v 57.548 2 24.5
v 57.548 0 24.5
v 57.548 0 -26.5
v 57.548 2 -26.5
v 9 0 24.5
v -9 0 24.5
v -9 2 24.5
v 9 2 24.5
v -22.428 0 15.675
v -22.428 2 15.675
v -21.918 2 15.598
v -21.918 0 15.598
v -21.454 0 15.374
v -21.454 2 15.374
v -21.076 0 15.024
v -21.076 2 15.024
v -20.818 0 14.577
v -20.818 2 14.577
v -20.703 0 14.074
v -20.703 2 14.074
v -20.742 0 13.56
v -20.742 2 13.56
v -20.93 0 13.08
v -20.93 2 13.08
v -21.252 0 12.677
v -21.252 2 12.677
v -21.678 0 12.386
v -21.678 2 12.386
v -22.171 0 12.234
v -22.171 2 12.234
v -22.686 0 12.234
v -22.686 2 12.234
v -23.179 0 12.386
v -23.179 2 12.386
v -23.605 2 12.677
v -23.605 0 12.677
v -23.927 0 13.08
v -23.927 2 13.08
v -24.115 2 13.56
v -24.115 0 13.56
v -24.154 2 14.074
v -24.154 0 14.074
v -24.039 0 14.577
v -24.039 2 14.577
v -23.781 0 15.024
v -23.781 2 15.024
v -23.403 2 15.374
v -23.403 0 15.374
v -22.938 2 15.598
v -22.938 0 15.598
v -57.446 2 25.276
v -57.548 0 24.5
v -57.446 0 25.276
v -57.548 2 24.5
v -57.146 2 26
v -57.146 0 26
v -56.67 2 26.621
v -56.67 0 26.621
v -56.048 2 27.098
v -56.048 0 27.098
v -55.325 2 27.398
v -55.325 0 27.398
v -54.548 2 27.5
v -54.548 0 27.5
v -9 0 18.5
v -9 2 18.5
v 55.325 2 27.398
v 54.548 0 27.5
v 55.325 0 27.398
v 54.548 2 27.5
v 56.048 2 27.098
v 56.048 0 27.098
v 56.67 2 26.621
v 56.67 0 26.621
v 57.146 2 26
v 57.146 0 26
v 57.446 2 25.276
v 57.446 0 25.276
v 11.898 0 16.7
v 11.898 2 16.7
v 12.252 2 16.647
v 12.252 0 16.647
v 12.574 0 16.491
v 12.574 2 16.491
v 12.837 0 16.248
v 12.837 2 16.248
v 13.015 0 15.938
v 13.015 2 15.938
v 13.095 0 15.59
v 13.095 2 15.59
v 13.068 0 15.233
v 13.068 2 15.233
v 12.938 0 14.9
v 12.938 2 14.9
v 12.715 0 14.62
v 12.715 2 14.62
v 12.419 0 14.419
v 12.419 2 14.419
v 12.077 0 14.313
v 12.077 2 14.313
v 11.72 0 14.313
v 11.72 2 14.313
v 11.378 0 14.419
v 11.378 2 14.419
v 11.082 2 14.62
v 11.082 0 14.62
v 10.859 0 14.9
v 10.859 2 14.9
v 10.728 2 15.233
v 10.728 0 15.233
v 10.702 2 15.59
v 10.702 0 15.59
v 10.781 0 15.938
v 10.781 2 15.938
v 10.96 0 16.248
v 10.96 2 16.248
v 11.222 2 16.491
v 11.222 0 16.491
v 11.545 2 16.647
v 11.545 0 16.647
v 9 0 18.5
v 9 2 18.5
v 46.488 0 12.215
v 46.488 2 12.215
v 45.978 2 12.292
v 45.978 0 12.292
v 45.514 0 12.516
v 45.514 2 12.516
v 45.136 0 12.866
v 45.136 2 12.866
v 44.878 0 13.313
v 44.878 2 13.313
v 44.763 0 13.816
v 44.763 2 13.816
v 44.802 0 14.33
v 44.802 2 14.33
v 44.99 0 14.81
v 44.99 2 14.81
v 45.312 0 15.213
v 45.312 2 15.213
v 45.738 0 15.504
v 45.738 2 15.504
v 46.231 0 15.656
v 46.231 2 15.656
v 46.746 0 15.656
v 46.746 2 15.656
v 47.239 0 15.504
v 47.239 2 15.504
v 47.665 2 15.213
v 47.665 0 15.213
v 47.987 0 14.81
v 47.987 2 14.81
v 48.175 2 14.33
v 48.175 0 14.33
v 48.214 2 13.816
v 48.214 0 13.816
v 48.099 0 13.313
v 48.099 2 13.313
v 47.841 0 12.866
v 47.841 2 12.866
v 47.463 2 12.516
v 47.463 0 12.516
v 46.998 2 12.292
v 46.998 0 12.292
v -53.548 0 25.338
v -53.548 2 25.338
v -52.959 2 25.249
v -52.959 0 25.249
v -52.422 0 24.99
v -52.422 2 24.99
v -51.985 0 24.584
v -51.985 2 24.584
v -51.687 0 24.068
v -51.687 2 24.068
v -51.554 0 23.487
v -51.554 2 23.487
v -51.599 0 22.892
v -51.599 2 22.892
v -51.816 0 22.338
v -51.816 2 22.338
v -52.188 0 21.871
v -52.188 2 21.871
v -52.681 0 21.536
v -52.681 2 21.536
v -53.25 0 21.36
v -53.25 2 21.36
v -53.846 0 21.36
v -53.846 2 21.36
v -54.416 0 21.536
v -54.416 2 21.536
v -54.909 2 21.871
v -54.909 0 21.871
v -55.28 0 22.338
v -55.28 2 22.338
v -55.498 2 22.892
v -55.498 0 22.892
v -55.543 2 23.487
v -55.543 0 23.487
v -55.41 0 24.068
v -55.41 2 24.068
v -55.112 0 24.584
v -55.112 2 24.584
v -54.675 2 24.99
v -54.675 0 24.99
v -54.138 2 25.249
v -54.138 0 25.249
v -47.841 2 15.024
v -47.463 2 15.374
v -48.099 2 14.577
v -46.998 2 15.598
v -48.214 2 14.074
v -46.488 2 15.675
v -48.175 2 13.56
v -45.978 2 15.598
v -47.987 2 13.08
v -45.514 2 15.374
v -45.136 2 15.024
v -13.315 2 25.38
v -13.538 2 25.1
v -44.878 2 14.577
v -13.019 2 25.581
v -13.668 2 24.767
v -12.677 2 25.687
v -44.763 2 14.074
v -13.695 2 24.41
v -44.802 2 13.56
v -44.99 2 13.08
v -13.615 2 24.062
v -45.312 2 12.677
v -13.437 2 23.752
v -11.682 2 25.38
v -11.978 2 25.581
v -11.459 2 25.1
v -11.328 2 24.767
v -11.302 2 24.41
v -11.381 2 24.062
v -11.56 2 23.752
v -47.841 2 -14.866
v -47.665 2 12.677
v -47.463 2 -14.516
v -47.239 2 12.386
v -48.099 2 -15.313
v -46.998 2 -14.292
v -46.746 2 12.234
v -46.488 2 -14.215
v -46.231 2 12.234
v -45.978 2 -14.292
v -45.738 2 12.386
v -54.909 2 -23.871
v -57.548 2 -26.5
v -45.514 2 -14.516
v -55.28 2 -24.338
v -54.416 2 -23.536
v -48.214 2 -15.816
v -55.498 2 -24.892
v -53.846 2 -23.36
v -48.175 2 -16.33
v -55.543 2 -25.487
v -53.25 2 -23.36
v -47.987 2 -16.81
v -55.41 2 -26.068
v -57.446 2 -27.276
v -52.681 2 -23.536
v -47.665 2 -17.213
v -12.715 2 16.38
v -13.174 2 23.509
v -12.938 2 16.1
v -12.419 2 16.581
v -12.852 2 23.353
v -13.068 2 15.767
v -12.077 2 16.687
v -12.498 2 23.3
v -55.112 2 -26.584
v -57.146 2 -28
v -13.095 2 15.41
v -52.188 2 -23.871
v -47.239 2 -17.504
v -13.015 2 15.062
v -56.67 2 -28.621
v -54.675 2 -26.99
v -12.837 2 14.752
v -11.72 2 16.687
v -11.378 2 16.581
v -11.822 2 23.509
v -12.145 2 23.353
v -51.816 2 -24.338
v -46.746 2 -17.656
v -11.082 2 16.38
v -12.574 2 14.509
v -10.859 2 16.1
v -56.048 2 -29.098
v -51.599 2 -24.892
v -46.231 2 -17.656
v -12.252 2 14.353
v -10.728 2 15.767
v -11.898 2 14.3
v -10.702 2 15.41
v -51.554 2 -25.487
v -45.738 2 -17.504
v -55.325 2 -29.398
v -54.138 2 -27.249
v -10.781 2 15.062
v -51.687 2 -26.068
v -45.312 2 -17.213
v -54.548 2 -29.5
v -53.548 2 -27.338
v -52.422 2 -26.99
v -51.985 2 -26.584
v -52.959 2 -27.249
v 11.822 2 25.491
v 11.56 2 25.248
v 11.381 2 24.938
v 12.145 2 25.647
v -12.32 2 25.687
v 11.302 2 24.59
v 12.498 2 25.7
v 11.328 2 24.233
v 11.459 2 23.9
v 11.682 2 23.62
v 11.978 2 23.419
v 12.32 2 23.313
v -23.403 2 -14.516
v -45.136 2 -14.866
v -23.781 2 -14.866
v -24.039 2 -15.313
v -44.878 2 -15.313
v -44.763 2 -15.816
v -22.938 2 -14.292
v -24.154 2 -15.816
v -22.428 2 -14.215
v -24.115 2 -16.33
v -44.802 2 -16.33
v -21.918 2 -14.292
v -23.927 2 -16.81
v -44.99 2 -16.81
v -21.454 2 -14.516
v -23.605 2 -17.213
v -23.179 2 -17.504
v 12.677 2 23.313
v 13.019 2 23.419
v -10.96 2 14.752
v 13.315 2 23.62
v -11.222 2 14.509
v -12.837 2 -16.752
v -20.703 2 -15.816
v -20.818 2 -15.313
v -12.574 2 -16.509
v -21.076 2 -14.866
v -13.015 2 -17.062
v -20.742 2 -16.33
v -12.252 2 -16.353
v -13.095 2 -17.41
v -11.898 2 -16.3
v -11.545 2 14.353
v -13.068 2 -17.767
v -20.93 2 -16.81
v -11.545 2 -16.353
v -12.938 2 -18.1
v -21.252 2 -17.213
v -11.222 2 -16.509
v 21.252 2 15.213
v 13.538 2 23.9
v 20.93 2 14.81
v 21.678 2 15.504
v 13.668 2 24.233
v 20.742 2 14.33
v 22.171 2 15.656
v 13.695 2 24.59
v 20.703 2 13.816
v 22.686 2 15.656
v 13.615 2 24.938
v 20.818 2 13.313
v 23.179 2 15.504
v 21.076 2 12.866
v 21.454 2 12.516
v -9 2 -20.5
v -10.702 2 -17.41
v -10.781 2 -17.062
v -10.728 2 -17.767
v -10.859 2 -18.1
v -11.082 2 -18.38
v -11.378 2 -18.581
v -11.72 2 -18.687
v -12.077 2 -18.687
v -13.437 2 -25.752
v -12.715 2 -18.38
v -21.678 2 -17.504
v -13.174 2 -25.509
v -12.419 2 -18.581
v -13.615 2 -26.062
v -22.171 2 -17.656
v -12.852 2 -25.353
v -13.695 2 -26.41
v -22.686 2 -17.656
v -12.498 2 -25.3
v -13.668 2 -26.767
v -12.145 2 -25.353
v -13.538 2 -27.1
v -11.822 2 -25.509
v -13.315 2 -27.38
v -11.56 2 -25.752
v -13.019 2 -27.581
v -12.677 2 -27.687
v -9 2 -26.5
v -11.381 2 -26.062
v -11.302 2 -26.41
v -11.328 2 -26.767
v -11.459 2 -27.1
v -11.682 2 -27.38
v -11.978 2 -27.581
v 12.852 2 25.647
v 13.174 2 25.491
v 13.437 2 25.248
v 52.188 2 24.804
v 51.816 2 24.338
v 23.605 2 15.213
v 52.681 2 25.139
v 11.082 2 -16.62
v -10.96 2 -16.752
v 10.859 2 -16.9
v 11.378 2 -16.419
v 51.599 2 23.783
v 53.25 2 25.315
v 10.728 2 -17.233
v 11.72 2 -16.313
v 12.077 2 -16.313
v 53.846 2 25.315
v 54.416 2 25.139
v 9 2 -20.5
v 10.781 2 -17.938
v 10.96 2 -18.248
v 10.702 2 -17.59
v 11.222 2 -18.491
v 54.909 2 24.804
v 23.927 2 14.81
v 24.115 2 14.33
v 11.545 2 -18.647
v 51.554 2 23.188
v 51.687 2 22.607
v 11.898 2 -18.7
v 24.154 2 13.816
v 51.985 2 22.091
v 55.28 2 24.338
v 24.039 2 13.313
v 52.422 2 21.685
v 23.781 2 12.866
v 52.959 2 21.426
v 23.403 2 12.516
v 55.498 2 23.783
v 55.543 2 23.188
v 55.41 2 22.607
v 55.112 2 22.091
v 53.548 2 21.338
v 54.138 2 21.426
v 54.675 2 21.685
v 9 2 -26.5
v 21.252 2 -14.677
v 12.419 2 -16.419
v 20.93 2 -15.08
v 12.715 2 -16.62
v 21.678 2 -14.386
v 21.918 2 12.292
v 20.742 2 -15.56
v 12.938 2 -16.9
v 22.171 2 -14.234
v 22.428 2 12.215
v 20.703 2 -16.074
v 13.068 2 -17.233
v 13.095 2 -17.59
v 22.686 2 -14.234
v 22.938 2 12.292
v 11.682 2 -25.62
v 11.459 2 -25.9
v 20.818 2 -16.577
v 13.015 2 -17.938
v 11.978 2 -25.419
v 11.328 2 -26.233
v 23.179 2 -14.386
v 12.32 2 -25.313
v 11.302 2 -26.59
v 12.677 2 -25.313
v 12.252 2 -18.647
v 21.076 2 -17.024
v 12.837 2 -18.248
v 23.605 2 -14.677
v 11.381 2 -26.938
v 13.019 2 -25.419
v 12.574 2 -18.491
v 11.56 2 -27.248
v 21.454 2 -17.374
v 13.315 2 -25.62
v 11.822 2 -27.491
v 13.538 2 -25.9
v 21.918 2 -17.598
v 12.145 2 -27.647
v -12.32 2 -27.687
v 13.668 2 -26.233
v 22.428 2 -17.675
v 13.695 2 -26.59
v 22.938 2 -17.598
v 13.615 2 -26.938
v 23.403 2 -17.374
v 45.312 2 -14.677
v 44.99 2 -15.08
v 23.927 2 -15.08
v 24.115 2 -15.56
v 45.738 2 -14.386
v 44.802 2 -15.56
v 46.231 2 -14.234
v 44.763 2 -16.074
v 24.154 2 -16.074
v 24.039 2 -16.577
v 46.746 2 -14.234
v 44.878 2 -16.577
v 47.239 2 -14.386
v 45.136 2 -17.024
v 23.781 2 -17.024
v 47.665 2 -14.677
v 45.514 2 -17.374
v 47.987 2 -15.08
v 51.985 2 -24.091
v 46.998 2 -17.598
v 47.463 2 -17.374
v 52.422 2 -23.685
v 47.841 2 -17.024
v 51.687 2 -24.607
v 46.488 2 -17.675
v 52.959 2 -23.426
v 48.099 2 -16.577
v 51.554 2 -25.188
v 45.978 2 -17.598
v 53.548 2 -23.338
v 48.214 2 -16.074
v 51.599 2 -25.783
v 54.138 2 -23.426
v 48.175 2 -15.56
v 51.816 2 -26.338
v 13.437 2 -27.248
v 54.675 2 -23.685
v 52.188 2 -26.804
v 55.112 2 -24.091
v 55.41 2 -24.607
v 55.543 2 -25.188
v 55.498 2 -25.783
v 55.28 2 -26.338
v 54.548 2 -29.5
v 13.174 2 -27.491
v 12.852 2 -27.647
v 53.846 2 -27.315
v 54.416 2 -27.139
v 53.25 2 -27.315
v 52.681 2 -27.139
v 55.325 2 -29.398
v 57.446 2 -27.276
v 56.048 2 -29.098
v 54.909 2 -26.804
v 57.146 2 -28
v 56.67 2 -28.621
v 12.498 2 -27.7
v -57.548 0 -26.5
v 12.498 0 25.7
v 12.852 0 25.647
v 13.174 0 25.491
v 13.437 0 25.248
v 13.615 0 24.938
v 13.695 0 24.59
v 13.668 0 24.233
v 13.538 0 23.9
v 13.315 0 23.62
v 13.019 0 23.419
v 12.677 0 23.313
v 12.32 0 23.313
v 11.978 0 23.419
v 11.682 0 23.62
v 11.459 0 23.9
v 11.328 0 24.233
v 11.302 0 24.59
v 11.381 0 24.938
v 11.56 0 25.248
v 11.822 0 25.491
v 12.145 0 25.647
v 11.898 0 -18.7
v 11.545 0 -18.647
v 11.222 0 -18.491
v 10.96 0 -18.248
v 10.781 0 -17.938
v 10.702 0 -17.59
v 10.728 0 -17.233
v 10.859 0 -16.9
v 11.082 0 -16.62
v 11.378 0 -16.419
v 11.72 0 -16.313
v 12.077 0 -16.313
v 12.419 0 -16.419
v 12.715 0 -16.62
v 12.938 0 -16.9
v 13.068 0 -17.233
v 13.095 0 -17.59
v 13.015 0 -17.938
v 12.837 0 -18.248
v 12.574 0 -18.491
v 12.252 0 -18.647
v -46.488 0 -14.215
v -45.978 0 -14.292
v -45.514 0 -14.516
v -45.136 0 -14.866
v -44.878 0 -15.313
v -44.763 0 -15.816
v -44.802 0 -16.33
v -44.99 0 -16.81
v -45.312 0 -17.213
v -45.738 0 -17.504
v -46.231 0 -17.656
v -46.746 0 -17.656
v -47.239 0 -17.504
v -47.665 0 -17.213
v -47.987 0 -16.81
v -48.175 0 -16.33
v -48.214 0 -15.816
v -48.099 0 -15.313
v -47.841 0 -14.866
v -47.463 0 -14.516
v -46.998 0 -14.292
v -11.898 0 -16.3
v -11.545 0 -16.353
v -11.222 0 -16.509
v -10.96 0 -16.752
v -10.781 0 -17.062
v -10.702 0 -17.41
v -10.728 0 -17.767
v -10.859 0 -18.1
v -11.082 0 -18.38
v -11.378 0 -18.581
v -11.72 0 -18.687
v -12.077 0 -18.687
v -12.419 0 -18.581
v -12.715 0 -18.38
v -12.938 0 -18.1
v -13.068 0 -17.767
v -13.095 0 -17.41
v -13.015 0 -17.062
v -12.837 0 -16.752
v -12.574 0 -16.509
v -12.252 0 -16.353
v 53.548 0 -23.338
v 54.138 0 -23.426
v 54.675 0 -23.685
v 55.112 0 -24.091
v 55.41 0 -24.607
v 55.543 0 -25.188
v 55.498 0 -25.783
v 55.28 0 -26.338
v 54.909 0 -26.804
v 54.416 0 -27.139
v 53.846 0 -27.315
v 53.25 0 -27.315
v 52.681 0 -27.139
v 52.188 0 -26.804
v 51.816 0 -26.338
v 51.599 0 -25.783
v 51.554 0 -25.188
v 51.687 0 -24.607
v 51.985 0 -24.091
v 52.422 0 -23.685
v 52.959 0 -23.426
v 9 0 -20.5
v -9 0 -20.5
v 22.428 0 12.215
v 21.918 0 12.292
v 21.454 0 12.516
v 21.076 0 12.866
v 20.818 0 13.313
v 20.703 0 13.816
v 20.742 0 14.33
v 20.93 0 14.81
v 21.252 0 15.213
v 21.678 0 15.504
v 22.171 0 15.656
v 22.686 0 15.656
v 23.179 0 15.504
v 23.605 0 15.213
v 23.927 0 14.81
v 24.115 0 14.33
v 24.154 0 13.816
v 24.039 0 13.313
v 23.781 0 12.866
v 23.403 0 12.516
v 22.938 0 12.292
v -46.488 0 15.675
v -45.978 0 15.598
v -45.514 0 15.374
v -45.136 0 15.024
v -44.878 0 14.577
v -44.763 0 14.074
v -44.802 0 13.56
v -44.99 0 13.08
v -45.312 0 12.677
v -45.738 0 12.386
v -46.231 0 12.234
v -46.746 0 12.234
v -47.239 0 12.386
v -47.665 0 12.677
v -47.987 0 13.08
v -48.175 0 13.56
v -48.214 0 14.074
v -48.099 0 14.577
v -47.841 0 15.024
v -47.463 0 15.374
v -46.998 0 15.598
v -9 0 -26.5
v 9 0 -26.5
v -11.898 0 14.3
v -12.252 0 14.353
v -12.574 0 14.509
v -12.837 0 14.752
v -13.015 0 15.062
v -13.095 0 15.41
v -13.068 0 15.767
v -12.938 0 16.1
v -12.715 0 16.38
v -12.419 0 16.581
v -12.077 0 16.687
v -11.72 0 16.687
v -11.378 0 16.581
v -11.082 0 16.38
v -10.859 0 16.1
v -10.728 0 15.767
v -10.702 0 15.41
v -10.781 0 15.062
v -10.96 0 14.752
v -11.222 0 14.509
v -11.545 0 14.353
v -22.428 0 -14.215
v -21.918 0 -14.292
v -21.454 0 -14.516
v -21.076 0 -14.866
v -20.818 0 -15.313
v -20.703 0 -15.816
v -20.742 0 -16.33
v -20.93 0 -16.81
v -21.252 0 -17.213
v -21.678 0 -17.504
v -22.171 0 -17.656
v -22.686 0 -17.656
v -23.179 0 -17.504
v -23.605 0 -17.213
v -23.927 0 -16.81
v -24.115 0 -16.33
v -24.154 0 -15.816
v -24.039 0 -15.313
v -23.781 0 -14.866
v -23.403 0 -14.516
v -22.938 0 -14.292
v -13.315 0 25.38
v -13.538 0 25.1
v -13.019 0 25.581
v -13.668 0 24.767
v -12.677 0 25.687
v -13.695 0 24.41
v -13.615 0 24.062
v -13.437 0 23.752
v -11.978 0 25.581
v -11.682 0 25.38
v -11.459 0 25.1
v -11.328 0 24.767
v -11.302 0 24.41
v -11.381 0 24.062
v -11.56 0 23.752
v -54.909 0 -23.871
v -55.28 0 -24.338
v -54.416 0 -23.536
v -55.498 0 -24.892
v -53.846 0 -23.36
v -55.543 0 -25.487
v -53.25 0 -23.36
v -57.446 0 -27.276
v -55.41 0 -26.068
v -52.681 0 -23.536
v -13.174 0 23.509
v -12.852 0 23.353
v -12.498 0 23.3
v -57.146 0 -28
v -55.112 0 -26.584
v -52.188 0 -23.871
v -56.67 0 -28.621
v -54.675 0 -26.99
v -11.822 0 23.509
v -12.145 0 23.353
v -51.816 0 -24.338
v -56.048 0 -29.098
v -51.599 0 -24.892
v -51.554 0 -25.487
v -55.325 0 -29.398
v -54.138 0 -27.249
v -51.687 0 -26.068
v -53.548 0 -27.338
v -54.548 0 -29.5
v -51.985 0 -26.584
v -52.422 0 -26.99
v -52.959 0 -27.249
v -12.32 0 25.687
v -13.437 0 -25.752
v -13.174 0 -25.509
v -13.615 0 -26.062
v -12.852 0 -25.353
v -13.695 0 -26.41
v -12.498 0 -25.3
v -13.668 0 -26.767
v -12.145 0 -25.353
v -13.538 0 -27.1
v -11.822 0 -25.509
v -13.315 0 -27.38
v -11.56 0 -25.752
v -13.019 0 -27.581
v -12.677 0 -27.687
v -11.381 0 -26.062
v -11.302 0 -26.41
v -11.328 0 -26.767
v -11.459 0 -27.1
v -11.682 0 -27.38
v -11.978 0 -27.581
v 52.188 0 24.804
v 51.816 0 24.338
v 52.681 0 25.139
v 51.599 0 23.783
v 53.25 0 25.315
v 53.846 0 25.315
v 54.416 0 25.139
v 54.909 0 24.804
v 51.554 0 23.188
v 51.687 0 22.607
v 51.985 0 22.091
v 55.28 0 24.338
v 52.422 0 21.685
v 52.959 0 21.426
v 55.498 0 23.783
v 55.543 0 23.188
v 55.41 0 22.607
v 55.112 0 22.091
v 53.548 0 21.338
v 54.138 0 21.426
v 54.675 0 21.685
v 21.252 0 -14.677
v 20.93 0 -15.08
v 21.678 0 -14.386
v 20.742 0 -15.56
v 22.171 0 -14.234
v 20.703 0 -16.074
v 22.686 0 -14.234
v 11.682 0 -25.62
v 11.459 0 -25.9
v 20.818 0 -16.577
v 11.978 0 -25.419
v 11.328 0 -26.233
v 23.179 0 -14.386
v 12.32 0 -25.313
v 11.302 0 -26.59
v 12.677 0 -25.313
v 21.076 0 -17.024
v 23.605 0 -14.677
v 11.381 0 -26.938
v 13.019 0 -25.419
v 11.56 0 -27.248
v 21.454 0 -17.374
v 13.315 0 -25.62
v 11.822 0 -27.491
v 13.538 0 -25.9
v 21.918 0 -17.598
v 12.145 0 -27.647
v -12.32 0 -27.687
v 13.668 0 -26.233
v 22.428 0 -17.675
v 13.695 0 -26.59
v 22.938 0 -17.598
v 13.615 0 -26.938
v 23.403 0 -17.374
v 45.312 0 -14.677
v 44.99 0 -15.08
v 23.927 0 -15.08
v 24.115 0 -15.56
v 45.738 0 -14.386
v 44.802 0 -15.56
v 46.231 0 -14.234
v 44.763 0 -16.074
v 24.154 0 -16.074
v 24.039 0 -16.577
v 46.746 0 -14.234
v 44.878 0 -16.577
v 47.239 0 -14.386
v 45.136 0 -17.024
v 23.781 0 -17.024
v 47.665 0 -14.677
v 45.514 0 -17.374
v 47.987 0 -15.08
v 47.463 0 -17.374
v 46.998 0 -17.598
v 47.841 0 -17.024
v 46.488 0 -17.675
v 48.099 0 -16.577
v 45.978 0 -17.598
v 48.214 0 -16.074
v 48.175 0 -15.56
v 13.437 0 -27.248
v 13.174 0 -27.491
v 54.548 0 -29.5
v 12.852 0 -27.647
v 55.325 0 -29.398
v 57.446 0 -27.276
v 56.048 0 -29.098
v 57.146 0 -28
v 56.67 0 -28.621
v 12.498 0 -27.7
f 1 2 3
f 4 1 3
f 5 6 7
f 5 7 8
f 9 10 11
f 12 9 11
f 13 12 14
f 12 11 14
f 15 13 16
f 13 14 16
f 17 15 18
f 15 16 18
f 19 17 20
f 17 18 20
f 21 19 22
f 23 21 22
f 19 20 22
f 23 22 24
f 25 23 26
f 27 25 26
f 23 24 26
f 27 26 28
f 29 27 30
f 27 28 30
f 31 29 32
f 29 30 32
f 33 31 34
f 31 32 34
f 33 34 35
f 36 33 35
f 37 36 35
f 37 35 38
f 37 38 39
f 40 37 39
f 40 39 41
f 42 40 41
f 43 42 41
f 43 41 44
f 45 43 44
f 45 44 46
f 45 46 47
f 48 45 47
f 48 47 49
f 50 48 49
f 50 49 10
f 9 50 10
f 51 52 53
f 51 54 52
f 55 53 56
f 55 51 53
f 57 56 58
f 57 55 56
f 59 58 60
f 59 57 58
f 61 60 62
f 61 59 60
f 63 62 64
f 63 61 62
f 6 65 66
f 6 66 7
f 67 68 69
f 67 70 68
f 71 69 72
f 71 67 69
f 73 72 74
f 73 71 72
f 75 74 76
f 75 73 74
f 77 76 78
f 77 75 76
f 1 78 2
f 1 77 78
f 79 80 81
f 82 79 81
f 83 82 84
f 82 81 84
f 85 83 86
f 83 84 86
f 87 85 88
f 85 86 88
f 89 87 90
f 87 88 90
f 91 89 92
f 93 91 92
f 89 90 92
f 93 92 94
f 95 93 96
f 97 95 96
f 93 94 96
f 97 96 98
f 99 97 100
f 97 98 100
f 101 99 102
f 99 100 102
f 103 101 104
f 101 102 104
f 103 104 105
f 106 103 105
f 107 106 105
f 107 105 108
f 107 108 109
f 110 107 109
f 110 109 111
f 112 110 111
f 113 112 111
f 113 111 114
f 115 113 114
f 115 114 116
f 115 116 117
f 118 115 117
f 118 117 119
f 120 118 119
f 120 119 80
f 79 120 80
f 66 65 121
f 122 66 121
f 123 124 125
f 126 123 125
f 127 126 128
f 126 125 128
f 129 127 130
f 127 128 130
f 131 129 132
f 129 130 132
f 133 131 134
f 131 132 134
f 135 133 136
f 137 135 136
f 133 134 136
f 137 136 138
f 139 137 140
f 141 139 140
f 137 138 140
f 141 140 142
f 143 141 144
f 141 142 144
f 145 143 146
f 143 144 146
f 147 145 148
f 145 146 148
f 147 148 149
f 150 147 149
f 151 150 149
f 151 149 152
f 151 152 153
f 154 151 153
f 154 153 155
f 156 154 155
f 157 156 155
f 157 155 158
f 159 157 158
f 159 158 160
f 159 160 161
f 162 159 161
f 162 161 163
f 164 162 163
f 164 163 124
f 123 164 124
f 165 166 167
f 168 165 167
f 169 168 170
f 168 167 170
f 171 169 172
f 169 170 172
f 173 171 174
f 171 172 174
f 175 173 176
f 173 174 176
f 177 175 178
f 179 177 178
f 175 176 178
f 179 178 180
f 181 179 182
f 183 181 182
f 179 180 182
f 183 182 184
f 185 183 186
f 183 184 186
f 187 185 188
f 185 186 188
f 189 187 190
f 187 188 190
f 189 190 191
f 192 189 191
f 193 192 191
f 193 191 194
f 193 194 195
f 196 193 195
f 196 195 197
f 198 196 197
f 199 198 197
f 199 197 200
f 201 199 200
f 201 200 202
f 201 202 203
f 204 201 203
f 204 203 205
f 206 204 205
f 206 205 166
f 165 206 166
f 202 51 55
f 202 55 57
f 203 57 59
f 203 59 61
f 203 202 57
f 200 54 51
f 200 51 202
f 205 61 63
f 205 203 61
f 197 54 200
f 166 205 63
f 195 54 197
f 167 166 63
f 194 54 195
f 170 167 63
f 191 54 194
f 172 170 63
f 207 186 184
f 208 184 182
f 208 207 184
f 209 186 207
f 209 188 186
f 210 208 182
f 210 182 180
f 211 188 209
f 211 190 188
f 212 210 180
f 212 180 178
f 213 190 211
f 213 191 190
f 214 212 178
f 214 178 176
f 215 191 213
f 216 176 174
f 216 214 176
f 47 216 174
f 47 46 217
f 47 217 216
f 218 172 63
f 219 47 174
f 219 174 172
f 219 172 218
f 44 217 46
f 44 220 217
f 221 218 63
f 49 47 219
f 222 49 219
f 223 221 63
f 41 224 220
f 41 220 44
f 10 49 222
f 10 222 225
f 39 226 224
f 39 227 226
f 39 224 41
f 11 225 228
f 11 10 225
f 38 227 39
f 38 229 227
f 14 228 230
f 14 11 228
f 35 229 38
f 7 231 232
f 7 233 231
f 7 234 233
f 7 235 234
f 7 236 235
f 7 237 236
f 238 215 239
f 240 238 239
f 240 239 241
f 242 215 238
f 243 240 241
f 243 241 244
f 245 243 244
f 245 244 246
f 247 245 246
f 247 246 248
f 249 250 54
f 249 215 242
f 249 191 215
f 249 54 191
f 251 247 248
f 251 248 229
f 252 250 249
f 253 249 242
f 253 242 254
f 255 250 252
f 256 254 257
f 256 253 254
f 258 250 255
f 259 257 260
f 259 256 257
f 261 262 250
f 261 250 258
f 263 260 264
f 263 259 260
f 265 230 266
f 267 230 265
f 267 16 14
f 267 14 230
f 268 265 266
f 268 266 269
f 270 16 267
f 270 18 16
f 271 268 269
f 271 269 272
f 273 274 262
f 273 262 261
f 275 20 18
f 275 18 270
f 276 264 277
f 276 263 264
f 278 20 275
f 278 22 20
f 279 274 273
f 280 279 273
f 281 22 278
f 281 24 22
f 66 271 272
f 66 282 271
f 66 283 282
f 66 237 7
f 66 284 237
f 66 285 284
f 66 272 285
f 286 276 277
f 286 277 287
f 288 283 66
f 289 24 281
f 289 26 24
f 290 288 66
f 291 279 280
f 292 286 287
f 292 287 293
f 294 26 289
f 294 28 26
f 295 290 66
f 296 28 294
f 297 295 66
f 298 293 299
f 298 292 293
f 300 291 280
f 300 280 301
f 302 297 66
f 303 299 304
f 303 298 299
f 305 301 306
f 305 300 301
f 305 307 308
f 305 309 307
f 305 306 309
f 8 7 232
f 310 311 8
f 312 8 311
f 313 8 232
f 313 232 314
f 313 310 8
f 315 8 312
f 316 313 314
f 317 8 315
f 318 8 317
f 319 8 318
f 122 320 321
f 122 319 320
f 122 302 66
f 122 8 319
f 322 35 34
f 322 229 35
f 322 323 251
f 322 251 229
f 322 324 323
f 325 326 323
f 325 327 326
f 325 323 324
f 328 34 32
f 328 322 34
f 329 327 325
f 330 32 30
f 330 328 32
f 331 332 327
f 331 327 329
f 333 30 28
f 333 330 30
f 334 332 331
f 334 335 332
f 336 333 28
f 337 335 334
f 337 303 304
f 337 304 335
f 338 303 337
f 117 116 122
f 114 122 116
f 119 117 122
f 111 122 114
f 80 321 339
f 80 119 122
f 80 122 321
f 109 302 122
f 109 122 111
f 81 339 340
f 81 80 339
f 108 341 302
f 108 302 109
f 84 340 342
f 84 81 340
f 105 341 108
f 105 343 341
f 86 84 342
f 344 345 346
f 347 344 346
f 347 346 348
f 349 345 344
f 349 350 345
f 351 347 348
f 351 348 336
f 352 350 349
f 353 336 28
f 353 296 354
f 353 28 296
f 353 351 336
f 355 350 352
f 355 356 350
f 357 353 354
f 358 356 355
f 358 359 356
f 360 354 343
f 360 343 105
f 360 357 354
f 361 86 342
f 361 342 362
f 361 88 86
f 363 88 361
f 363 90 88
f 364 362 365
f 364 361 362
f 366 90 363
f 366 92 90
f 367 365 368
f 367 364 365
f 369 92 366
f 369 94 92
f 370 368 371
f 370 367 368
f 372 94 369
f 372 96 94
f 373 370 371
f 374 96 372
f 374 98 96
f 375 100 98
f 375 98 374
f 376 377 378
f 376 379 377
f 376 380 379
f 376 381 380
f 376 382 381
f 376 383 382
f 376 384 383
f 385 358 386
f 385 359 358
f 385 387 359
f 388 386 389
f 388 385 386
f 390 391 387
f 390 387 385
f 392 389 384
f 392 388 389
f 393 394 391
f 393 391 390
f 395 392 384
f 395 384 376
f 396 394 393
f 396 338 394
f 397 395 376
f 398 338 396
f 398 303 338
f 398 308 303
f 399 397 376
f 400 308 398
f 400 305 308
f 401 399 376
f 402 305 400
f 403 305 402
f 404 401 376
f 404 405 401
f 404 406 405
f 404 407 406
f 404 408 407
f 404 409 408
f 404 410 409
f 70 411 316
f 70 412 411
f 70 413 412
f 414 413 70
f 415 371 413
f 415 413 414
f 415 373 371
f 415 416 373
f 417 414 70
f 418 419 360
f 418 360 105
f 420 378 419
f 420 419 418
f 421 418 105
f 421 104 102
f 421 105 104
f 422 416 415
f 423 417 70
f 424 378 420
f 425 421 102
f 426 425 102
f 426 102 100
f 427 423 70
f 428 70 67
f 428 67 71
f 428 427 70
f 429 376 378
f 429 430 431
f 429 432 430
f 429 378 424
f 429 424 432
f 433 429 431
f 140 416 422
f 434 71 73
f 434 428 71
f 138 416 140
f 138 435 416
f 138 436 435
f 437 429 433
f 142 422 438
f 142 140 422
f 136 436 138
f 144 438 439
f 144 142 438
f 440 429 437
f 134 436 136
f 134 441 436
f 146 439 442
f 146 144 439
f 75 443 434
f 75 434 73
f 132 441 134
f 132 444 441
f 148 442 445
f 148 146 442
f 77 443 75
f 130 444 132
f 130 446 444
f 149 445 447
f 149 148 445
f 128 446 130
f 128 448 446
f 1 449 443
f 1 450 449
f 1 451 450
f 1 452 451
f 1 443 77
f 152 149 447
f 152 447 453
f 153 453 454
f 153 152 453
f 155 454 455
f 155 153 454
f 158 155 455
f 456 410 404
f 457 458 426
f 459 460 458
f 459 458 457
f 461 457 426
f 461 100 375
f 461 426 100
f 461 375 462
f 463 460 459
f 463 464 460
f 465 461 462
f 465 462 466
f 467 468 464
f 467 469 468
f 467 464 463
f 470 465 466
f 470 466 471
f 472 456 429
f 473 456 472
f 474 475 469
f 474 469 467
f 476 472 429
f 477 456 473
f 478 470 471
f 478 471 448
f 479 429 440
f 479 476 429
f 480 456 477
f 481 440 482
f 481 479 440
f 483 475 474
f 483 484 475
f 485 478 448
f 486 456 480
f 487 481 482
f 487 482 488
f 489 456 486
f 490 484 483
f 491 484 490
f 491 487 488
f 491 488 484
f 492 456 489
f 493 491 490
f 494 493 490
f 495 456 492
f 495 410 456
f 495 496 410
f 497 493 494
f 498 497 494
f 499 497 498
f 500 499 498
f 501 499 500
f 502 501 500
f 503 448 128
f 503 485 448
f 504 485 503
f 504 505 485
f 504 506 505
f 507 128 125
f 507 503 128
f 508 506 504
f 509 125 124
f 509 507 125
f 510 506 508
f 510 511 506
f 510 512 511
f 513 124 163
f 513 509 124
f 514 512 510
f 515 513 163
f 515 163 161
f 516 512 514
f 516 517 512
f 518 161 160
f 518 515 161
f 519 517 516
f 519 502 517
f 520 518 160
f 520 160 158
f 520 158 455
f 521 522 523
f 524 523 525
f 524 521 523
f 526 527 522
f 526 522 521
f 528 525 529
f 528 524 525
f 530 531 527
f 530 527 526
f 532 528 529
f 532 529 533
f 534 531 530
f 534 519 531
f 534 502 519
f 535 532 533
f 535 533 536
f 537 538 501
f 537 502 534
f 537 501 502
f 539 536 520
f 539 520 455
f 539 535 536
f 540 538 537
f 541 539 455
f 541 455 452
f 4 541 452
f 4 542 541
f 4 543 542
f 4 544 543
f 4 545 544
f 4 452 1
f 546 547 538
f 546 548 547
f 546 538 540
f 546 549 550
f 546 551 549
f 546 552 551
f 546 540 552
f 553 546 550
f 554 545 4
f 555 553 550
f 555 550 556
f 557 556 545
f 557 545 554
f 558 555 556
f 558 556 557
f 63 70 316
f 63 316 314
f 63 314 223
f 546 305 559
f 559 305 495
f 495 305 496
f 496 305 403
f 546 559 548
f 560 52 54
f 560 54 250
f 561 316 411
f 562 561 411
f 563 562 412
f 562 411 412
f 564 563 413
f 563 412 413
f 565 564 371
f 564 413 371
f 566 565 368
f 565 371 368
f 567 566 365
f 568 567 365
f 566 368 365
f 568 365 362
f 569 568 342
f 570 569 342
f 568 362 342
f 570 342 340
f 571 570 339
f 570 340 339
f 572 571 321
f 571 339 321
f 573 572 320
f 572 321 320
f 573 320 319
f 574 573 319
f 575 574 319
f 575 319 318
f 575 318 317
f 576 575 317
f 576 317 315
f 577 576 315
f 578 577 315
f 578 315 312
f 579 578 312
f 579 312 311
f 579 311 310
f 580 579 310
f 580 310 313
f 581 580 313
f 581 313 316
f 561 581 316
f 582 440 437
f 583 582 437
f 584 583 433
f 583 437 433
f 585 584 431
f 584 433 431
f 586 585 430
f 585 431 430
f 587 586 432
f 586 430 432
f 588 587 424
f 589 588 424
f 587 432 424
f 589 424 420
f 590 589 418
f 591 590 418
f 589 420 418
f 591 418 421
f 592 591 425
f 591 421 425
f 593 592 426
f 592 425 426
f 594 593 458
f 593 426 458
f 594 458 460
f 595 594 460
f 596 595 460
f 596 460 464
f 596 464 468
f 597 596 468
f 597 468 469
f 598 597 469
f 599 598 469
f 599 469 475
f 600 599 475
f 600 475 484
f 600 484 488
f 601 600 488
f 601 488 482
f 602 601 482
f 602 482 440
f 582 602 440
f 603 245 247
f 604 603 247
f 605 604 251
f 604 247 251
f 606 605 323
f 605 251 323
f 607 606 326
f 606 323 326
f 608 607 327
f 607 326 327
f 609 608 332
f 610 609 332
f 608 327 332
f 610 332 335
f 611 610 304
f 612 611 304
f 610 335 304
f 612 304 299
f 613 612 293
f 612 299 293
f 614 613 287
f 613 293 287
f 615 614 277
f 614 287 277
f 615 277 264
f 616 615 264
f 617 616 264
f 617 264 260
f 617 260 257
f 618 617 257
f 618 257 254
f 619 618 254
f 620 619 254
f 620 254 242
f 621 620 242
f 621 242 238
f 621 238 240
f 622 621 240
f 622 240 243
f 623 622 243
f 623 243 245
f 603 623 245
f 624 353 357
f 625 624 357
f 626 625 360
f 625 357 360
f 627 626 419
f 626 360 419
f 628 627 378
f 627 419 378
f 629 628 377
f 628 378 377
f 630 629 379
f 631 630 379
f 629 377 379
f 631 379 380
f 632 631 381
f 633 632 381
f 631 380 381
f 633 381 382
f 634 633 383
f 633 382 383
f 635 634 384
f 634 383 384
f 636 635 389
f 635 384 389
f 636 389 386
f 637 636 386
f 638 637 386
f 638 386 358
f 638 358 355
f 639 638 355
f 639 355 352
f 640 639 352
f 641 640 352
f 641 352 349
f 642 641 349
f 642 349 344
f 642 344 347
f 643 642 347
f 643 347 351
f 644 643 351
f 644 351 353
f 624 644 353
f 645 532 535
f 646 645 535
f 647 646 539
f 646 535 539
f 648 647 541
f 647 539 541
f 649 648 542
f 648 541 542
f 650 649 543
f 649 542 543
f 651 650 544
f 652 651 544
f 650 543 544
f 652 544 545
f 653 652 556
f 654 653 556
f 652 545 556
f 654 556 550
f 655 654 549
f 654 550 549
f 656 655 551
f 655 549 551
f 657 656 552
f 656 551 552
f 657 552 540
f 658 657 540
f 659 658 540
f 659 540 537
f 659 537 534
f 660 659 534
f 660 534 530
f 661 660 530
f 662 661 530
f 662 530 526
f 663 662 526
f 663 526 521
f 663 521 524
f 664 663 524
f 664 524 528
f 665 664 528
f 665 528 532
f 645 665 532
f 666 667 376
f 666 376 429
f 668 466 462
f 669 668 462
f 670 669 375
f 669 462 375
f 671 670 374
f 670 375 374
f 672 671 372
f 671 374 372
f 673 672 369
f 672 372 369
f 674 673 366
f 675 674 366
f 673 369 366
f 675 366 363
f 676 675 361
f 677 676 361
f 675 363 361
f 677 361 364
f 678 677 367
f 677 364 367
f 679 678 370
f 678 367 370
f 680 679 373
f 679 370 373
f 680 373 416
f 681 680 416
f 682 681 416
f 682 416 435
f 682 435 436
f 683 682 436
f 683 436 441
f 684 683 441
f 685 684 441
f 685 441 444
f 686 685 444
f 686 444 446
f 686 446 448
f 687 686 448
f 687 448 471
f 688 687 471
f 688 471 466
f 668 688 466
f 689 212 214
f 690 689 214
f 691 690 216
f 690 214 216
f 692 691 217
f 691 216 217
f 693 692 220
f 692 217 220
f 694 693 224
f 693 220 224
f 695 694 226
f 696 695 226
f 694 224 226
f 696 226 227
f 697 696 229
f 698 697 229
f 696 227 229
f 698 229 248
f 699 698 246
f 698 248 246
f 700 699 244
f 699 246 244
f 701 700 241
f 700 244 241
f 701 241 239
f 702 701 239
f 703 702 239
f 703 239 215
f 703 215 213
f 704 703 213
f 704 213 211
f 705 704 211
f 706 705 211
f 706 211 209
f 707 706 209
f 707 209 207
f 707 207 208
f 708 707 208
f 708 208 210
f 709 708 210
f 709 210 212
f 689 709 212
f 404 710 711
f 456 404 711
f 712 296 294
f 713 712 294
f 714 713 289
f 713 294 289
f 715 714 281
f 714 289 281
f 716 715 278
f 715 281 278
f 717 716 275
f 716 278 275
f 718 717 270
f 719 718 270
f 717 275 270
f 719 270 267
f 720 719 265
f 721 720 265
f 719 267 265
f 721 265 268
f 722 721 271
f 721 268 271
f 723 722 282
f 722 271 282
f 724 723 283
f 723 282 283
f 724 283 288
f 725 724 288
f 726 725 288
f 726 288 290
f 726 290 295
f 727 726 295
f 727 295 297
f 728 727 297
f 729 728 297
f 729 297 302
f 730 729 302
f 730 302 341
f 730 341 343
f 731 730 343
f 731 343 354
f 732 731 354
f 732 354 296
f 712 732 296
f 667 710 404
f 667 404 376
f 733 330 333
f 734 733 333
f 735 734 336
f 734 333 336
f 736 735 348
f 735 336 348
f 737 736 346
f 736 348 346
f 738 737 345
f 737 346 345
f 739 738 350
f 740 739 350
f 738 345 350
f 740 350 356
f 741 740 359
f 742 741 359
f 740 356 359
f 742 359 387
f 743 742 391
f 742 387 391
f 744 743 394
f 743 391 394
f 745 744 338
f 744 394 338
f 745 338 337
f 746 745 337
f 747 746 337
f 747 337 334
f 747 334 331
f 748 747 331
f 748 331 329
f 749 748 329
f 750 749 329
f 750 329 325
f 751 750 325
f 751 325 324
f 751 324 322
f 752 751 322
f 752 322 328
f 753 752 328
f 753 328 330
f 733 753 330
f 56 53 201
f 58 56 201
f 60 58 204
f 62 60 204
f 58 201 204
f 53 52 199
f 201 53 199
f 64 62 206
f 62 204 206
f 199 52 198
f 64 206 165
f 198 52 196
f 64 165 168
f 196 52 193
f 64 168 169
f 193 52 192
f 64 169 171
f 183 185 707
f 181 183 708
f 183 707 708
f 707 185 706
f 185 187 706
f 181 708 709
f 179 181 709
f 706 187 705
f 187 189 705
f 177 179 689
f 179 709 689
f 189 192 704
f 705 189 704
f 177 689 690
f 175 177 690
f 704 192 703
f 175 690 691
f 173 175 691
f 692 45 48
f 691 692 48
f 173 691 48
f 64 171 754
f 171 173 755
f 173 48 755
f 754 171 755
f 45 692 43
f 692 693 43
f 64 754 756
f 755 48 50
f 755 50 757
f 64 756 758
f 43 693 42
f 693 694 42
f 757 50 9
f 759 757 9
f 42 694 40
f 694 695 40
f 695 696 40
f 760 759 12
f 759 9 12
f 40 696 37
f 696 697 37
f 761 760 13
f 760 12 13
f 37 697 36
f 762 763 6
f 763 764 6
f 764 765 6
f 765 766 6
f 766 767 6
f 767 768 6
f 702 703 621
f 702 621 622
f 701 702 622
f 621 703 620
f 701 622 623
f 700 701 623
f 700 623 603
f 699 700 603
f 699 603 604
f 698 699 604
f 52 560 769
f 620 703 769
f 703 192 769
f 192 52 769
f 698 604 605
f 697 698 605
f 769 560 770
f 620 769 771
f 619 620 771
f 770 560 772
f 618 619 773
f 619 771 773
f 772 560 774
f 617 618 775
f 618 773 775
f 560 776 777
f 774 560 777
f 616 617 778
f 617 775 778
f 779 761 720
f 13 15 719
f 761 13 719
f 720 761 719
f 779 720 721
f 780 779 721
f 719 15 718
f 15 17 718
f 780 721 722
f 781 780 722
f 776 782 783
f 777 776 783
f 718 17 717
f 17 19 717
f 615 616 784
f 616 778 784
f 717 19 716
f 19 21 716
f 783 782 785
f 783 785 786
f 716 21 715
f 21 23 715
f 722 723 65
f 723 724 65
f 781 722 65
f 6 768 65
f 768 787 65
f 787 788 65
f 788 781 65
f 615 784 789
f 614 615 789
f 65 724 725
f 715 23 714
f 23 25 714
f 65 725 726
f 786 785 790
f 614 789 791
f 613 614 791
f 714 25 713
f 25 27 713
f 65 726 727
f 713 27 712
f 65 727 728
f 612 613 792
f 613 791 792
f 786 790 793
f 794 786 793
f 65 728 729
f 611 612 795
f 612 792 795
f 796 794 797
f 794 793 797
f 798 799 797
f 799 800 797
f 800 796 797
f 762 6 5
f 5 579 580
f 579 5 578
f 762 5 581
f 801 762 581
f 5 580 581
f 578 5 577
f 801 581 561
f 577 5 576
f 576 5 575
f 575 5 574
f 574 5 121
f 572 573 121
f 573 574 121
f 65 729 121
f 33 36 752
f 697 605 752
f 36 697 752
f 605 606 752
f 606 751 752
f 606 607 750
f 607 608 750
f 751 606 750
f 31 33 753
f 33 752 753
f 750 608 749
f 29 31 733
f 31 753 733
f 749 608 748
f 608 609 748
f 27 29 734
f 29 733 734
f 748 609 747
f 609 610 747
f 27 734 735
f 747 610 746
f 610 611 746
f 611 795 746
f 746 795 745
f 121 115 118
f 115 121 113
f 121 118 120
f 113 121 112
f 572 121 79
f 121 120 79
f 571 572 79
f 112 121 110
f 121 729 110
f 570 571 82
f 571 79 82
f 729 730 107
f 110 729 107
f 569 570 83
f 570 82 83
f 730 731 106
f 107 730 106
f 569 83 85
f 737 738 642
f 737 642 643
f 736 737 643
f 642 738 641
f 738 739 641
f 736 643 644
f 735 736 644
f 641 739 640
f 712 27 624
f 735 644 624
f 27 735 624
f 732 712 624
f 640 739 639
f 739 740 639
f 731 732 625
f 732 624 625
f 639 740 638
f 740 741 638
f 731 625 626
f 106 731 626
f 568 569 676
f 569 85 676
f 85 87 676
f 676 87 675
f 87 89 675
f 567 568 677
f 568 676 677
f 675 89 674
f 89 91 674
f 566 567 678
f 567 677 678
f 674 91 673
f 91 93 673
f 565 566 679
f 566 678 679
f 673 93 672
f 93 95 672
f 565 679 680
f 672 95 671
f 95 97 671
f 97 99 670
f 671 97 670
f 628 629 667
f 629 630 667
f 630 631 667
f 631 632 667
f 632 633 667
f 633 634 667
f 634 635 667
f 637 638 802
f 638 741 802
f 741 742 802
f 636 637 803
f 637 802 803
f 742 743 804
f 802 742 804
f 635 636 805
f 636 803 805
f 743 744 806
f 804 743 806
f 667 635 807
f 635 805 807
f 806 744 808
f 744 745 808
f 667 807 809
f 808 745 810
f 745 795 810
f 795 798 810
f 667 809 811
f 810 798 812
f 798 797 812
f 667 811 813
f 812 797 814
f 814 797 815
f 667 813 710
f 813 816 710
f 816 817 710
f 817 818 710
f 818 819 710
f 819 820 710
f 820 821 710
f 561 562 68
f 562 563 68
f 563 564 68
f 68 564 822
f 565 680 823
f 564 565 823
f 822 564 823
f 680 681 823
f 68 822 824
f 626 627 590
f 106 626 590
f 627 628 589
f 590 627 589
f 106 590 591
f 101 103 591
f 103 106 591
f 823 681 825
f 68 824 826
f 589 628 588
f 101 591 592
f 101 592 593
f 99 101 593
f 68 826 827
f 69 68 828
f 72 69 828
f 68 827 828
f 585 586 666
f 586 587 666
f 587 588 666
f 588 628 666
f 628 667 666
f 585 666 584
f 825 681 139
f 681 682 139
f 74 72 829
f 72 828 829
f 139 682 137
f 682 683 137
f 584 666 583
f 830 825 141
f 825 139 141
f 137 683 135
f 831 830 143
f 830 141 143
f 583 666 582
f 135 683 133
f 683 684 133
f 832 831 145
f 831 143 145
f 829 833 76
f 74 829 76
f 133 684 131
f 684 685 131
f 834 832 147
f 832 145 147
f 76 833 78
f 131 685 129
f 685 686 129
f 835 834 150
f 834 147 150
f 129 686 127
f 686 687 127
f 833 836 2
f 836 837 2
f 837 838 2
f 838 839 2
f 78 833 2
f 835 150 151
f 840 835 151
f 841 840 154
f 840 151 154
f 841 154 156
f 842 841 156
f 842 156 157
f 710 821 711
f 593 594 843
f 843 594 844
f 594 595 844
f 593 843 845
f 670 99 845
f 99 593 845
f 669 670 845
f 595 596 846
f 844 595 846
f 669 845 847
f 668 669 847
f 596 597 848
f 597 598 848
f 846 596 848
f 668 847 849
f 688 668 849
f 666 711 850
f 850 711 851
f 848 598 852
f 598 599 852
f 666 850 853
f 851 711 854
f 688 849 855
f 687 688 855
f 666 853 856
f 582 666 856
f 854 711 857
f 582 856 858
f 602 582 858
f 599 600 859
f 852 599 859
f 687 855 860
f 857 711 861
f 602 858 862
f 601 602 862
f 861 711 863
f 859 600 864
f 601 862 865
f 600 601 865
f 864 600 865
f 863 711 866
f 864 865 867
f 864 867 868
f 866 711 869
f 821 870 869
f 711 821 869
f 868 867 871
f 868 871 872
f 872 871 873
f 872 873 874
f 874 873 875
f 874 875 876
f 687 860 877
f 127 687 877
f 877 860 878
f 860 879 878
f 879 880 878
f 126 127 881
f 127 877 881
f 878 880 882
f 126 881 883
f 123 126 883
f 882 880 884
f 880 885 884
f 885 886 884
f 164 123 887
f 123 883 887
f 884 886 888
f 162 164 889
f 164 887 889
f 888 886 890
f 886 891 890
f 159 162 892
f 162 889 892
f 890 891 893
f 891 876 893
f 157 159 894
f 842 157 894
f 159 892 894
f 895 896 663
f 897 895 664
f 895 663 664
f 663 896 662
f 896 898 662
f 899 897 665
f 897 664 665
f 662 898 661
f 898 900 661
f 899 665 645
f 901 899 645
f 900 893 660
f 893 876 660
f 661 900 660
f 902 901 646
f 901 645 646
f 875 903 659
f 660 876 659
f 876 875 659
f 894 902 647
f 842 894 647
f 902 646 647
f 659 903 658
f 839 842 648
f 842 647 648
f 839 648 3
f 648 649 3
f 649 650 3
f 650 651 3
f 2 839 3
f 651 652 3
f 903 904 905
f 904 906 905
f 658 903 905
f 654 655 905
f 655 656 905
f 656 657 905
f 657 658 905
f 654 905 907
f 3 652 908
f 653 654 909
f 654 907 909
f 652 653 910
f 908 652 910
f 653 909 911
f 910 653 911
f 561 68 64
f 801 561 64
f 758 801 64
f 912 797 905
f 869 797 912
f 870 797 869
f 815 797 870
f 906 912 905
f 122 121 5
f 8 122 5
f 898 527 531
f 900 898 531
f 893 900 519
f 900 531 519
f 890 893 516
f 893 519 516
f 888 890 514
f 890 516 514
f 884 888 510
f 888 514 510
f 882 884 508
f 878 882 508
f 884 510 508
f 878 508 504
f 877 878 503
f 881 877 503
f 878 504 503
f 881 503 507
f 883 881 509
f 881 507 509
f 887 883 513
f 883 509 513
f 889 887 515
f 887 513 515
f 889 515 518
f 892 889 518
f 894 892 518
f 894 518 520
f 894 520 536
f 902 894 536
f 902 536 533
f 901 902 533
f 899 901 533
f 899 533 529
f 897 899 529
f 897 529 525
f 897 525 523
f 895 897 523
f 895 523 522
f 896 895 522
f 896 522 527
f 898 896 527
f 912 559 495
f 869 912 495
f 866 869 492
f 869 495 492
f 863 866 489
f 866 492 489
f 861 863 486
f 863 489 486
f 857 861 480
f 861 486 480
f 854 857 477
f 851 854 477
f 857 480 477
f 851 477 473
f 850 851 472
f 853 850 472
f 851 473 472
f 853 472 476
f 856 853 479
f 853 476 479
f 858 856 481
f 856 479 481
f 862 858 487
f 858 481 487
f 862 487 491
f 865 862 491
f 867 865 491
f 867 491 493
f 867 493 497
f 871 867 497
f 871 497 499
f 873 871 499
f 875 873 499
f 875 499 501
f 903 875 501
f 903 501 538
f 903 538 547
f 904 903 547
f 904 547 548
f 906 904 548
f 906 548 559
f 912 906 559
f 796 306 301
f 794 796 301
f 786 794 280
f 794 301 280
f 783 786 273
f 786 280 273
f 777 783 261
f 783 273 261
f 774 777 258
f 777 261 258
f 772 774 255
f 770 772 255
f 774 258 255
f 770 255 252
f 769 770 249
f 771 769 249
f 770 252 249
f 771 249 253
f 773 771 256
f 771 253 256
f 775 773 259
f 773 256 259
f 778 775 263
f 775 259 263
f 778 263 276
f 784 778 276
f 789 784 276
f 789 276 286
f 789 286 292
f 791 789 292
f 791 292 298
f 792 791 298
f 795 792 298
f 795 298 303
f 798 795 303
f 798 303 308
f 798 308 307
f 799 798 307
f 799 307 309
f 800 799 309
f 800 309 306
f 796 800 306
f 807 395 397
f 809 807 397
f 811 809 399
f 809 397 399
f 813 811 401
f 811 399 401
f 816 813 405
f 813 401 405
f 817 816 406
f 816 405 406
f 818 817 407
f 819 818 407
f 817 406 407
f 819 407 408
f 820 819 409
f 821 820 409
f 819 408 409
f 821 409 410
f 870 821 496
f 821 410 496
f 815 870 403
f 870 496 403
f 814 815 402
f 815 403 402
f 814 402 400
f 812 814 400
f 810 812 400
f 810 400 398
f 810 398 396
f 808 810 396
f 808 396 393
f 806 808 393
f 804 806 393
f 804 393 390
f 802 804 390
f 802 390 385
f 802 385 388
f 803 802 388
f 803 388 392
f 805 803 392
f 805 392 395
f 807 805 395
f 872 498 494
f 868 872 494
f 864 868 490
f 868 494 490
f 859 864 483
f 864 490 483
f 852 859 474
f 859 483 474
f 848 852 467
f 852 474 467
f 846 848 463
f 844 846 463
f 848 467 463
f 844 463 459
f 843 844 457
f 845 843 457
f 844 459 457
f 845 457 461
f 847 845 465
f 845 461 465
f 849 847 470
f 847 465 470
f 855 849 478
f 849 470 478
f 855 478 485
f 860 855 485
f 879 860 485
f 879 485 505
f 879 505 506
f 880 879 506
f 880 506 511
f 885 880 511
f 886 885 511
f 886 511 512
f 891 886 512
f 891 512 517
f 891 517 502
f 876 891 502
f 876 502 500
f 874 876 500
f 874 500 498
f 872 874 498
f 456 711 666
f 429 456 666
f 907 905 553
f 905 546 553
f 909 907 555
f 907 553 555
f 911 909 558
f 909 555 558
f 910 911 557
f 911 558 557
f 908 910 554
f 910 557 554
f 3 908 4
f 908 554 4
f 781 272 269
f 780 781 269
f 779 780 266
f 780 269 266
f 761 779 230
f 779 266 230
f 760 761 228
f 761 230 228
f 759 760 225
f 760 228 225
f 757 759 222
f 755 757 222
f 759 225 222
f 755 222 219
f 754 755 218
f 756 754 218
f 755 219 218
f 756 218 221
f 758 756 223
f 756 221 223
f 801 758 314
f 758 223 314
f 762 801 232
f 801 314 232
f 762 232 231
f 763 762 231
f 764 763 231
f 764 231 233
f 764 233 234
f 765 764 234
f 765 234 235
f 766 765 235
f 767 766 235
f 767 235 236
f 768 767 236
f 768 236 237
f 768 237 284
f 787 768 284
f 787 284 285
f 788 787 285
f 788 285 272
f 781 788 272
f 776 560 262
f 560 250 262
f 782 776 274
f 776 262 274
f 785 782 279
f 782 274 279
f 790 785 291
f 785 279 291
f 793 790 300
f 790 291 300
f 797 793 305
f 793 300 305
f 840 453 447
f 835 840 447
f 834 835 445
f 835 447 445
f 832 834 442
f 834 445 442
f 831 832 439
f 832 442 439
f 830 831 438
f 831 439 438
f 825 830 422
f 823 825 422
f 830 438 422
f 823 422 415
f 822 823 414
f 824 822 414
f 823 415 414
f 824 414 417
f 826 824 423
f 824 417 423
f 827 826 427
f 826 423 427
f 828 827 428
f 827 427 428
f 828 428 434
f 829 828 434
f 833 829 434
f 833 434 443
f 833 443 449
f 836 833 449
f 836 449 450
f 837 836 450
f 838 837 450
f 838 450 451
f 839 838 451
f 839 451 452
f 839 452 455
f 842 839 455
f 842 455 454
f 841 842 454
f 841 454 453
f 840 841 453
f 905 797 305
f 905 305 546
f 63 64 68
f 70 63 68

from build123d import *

# Parameters (mm, degrees)
ESBO_O1_W                = 115.09677689
ESBO_O1_H                = 57
RESSALTO_EXTRUS_O1_DEPTH = 2
ESBO_O2_R                = 1.73
CORTE_EXTRUS_O1_DEPTH    = 65.699822354
ESBO_O3_W                = 18
ESBO_O3_H                = 6
CORTE_EXTRUS_O2_DEPTH    = 65.699822354
ESBO_O5_R                = 2
CORTE_EXTRUS_O3_DEPTH    = 65.699822354
FILETE1_R                = 3
ESBO_O8_R                = 1.2
CORTE_EXTRUS_O4_DEPTH    = 65.699822354


with BuildPart() as part:
    # Esboço1 → Ressalto-extrusão1 (new body)
    with BuildSketch(Plane(origin=(0, 0, 0), x_dir=(1, 0, 0), z_dir=(0, 1, 0))):
        with Locations((0, 1)):
            Rectangle(ESBO_O1_W, ESBO_O1_H)
    extrude(amount=RESSALTO_EXTRUS_O1_DEPTH)

    # Esboço2 → Corte-extrusão1 (cut, through all)
    with BuildSketch(Plane(origin=(0, 2, 0), x_dir=(1, 0, 0), z_dir=(0, 1, 0))):
        with Locations(Location((-46.488388445, 15.945, 0), (0, 0, 270))):
            Circle(ESBO_O2_R)
        with Locations(Location((-22.428388445, 15.945, 0), (0, 0, 270))):
            Circle(ESBO_O2_R)
        with Locations(Location((-22.428388445, -13.945, 0), (0, 0, 270))):
            Circle(ESBO_O2_R)
        with Locations(Location((22.428388445, -13.945, 0), (0, 0, 90))):
            Circle(ESBO_O2_R)
        with Locations(Location((22.428388445, 15.945, 0), (0, 0, 90))):
            Circle(ESBO_O2_R)
        with Locations(Location((46.488388445, 15.945, 0), (0, 0, 90))):
            Circle(ESBO_O2_R)
        with Locations(Location((-46.488388445, -13.945, 0), (0, 0, 270))):
            Circle(ESBO_O2_R)
        with Locations(Location((46.488388445, -13.945, 0), (0, 0, 90))):
            Circle(ESBO_O2_R)
    extrude(amount=-CORTE_EXTRUS_O1_DEPTH, mode=Mode.SUBTRACT)

    # Esboço3 → Corte-extrusão2 (cut, through all)
    with BuildSketch(Plane.XZ):
        with Locations((0, 21.5)):
            Rectangle(ESBO_O3_W, ESBO_O3_H)
        with Locations((0, -23.5)):
            Rectangle(ESBO_O3_W, ESBO_O3_H)
    extrude(amount=-CORTE_EXTRUS_O2_DEPTH, mode=Mode.SUBTRACT)

    # Esboço5 → Corte-extrusão3 (cut, through all)
    with BuildSketch(Plane(origin=(0, 2, 0), x_dir=(1, 0, 0), z_dir=(0, 1, 0))):
        with Locations(Location((53.548388445, 25.3375, 0), (0, 0, 270))):
            Circle(ESBO_O5_R)
        with Locations(Location((53.548388445, -23.3375, 0), (0, 0, 90))):
            Circle(ESBO_O5_R)
        with Locations(Location((-53.548388445, -23.3375, 0), (0, 0, 270))):
            Circle(ESBO_O5_R)
        with Locations(Location((-53.548388445, 25.3375, 0), (0, 0, 90))):
            Circle(ESBO_O5_R)
    extrude(amount=-CORTE_EXTRUS_O3_DEPTH, mode=Mode.SUBTRACT)

    # Filete1
    filete1_edges = [part.edges().sort_by_distance(p)[0] for p in [
        (-57.548388445, 1, -29.5),
        (57.548388445, 1, -29.5),
        (57.548388445, 1, 27.5),
        (-57.548388445, 1, 27.5),
    ]]
    fillet(filete1_edges, radius=FILETE1_R)

    # Esboço8 → Corte-extrusão4 (cut, through all)
    with BuildSketch(Plane(origin=(0, 2, 0), x_dir=(1, 0, 0), z_dir=(0, 1, 0))):
        with Locations(Location((-12.498388445, 26.5, 0), (0, 0, 270))):
            Circle(ESBO_O8_R)
        with Locations(Location((12.498388445, 26.5, 0), (0, 0, 90))):
            Circle(ESBO_O8_R)
        with Locations(Location((12.498388445, -24.5, 0), (0, 0, 270))):
            Circle(ESBO_O8_R)
        with Locations(Location((-12.498388445, -24.5, 0), (0, 0, 90))):
            Circle(ESBO_O8_R)
        with Locations(Location((-11.898388445, 17.5, 0), (0, 0, 270))):
            Circle(ESBO_O8_R)
        with Locations(Location((11.898388445, 17.5, 0), (0, 0, 90))):
            Circle(ESBO_O8_R)
        with Locations(Location((11.898388445, -15.5, 0), (0, 0, 270))):
            Circle(ESBO_O8_R)
        with Locations(Location((-11.898388445, -15.5, 0), (0, 0, 90))):
            Circle(ESBO_O8_R)
    extrude(amount=-CORTE_EXTRUS_O4_DEPTH, mode=Mode.SUBTRACT)


solid = part.part
